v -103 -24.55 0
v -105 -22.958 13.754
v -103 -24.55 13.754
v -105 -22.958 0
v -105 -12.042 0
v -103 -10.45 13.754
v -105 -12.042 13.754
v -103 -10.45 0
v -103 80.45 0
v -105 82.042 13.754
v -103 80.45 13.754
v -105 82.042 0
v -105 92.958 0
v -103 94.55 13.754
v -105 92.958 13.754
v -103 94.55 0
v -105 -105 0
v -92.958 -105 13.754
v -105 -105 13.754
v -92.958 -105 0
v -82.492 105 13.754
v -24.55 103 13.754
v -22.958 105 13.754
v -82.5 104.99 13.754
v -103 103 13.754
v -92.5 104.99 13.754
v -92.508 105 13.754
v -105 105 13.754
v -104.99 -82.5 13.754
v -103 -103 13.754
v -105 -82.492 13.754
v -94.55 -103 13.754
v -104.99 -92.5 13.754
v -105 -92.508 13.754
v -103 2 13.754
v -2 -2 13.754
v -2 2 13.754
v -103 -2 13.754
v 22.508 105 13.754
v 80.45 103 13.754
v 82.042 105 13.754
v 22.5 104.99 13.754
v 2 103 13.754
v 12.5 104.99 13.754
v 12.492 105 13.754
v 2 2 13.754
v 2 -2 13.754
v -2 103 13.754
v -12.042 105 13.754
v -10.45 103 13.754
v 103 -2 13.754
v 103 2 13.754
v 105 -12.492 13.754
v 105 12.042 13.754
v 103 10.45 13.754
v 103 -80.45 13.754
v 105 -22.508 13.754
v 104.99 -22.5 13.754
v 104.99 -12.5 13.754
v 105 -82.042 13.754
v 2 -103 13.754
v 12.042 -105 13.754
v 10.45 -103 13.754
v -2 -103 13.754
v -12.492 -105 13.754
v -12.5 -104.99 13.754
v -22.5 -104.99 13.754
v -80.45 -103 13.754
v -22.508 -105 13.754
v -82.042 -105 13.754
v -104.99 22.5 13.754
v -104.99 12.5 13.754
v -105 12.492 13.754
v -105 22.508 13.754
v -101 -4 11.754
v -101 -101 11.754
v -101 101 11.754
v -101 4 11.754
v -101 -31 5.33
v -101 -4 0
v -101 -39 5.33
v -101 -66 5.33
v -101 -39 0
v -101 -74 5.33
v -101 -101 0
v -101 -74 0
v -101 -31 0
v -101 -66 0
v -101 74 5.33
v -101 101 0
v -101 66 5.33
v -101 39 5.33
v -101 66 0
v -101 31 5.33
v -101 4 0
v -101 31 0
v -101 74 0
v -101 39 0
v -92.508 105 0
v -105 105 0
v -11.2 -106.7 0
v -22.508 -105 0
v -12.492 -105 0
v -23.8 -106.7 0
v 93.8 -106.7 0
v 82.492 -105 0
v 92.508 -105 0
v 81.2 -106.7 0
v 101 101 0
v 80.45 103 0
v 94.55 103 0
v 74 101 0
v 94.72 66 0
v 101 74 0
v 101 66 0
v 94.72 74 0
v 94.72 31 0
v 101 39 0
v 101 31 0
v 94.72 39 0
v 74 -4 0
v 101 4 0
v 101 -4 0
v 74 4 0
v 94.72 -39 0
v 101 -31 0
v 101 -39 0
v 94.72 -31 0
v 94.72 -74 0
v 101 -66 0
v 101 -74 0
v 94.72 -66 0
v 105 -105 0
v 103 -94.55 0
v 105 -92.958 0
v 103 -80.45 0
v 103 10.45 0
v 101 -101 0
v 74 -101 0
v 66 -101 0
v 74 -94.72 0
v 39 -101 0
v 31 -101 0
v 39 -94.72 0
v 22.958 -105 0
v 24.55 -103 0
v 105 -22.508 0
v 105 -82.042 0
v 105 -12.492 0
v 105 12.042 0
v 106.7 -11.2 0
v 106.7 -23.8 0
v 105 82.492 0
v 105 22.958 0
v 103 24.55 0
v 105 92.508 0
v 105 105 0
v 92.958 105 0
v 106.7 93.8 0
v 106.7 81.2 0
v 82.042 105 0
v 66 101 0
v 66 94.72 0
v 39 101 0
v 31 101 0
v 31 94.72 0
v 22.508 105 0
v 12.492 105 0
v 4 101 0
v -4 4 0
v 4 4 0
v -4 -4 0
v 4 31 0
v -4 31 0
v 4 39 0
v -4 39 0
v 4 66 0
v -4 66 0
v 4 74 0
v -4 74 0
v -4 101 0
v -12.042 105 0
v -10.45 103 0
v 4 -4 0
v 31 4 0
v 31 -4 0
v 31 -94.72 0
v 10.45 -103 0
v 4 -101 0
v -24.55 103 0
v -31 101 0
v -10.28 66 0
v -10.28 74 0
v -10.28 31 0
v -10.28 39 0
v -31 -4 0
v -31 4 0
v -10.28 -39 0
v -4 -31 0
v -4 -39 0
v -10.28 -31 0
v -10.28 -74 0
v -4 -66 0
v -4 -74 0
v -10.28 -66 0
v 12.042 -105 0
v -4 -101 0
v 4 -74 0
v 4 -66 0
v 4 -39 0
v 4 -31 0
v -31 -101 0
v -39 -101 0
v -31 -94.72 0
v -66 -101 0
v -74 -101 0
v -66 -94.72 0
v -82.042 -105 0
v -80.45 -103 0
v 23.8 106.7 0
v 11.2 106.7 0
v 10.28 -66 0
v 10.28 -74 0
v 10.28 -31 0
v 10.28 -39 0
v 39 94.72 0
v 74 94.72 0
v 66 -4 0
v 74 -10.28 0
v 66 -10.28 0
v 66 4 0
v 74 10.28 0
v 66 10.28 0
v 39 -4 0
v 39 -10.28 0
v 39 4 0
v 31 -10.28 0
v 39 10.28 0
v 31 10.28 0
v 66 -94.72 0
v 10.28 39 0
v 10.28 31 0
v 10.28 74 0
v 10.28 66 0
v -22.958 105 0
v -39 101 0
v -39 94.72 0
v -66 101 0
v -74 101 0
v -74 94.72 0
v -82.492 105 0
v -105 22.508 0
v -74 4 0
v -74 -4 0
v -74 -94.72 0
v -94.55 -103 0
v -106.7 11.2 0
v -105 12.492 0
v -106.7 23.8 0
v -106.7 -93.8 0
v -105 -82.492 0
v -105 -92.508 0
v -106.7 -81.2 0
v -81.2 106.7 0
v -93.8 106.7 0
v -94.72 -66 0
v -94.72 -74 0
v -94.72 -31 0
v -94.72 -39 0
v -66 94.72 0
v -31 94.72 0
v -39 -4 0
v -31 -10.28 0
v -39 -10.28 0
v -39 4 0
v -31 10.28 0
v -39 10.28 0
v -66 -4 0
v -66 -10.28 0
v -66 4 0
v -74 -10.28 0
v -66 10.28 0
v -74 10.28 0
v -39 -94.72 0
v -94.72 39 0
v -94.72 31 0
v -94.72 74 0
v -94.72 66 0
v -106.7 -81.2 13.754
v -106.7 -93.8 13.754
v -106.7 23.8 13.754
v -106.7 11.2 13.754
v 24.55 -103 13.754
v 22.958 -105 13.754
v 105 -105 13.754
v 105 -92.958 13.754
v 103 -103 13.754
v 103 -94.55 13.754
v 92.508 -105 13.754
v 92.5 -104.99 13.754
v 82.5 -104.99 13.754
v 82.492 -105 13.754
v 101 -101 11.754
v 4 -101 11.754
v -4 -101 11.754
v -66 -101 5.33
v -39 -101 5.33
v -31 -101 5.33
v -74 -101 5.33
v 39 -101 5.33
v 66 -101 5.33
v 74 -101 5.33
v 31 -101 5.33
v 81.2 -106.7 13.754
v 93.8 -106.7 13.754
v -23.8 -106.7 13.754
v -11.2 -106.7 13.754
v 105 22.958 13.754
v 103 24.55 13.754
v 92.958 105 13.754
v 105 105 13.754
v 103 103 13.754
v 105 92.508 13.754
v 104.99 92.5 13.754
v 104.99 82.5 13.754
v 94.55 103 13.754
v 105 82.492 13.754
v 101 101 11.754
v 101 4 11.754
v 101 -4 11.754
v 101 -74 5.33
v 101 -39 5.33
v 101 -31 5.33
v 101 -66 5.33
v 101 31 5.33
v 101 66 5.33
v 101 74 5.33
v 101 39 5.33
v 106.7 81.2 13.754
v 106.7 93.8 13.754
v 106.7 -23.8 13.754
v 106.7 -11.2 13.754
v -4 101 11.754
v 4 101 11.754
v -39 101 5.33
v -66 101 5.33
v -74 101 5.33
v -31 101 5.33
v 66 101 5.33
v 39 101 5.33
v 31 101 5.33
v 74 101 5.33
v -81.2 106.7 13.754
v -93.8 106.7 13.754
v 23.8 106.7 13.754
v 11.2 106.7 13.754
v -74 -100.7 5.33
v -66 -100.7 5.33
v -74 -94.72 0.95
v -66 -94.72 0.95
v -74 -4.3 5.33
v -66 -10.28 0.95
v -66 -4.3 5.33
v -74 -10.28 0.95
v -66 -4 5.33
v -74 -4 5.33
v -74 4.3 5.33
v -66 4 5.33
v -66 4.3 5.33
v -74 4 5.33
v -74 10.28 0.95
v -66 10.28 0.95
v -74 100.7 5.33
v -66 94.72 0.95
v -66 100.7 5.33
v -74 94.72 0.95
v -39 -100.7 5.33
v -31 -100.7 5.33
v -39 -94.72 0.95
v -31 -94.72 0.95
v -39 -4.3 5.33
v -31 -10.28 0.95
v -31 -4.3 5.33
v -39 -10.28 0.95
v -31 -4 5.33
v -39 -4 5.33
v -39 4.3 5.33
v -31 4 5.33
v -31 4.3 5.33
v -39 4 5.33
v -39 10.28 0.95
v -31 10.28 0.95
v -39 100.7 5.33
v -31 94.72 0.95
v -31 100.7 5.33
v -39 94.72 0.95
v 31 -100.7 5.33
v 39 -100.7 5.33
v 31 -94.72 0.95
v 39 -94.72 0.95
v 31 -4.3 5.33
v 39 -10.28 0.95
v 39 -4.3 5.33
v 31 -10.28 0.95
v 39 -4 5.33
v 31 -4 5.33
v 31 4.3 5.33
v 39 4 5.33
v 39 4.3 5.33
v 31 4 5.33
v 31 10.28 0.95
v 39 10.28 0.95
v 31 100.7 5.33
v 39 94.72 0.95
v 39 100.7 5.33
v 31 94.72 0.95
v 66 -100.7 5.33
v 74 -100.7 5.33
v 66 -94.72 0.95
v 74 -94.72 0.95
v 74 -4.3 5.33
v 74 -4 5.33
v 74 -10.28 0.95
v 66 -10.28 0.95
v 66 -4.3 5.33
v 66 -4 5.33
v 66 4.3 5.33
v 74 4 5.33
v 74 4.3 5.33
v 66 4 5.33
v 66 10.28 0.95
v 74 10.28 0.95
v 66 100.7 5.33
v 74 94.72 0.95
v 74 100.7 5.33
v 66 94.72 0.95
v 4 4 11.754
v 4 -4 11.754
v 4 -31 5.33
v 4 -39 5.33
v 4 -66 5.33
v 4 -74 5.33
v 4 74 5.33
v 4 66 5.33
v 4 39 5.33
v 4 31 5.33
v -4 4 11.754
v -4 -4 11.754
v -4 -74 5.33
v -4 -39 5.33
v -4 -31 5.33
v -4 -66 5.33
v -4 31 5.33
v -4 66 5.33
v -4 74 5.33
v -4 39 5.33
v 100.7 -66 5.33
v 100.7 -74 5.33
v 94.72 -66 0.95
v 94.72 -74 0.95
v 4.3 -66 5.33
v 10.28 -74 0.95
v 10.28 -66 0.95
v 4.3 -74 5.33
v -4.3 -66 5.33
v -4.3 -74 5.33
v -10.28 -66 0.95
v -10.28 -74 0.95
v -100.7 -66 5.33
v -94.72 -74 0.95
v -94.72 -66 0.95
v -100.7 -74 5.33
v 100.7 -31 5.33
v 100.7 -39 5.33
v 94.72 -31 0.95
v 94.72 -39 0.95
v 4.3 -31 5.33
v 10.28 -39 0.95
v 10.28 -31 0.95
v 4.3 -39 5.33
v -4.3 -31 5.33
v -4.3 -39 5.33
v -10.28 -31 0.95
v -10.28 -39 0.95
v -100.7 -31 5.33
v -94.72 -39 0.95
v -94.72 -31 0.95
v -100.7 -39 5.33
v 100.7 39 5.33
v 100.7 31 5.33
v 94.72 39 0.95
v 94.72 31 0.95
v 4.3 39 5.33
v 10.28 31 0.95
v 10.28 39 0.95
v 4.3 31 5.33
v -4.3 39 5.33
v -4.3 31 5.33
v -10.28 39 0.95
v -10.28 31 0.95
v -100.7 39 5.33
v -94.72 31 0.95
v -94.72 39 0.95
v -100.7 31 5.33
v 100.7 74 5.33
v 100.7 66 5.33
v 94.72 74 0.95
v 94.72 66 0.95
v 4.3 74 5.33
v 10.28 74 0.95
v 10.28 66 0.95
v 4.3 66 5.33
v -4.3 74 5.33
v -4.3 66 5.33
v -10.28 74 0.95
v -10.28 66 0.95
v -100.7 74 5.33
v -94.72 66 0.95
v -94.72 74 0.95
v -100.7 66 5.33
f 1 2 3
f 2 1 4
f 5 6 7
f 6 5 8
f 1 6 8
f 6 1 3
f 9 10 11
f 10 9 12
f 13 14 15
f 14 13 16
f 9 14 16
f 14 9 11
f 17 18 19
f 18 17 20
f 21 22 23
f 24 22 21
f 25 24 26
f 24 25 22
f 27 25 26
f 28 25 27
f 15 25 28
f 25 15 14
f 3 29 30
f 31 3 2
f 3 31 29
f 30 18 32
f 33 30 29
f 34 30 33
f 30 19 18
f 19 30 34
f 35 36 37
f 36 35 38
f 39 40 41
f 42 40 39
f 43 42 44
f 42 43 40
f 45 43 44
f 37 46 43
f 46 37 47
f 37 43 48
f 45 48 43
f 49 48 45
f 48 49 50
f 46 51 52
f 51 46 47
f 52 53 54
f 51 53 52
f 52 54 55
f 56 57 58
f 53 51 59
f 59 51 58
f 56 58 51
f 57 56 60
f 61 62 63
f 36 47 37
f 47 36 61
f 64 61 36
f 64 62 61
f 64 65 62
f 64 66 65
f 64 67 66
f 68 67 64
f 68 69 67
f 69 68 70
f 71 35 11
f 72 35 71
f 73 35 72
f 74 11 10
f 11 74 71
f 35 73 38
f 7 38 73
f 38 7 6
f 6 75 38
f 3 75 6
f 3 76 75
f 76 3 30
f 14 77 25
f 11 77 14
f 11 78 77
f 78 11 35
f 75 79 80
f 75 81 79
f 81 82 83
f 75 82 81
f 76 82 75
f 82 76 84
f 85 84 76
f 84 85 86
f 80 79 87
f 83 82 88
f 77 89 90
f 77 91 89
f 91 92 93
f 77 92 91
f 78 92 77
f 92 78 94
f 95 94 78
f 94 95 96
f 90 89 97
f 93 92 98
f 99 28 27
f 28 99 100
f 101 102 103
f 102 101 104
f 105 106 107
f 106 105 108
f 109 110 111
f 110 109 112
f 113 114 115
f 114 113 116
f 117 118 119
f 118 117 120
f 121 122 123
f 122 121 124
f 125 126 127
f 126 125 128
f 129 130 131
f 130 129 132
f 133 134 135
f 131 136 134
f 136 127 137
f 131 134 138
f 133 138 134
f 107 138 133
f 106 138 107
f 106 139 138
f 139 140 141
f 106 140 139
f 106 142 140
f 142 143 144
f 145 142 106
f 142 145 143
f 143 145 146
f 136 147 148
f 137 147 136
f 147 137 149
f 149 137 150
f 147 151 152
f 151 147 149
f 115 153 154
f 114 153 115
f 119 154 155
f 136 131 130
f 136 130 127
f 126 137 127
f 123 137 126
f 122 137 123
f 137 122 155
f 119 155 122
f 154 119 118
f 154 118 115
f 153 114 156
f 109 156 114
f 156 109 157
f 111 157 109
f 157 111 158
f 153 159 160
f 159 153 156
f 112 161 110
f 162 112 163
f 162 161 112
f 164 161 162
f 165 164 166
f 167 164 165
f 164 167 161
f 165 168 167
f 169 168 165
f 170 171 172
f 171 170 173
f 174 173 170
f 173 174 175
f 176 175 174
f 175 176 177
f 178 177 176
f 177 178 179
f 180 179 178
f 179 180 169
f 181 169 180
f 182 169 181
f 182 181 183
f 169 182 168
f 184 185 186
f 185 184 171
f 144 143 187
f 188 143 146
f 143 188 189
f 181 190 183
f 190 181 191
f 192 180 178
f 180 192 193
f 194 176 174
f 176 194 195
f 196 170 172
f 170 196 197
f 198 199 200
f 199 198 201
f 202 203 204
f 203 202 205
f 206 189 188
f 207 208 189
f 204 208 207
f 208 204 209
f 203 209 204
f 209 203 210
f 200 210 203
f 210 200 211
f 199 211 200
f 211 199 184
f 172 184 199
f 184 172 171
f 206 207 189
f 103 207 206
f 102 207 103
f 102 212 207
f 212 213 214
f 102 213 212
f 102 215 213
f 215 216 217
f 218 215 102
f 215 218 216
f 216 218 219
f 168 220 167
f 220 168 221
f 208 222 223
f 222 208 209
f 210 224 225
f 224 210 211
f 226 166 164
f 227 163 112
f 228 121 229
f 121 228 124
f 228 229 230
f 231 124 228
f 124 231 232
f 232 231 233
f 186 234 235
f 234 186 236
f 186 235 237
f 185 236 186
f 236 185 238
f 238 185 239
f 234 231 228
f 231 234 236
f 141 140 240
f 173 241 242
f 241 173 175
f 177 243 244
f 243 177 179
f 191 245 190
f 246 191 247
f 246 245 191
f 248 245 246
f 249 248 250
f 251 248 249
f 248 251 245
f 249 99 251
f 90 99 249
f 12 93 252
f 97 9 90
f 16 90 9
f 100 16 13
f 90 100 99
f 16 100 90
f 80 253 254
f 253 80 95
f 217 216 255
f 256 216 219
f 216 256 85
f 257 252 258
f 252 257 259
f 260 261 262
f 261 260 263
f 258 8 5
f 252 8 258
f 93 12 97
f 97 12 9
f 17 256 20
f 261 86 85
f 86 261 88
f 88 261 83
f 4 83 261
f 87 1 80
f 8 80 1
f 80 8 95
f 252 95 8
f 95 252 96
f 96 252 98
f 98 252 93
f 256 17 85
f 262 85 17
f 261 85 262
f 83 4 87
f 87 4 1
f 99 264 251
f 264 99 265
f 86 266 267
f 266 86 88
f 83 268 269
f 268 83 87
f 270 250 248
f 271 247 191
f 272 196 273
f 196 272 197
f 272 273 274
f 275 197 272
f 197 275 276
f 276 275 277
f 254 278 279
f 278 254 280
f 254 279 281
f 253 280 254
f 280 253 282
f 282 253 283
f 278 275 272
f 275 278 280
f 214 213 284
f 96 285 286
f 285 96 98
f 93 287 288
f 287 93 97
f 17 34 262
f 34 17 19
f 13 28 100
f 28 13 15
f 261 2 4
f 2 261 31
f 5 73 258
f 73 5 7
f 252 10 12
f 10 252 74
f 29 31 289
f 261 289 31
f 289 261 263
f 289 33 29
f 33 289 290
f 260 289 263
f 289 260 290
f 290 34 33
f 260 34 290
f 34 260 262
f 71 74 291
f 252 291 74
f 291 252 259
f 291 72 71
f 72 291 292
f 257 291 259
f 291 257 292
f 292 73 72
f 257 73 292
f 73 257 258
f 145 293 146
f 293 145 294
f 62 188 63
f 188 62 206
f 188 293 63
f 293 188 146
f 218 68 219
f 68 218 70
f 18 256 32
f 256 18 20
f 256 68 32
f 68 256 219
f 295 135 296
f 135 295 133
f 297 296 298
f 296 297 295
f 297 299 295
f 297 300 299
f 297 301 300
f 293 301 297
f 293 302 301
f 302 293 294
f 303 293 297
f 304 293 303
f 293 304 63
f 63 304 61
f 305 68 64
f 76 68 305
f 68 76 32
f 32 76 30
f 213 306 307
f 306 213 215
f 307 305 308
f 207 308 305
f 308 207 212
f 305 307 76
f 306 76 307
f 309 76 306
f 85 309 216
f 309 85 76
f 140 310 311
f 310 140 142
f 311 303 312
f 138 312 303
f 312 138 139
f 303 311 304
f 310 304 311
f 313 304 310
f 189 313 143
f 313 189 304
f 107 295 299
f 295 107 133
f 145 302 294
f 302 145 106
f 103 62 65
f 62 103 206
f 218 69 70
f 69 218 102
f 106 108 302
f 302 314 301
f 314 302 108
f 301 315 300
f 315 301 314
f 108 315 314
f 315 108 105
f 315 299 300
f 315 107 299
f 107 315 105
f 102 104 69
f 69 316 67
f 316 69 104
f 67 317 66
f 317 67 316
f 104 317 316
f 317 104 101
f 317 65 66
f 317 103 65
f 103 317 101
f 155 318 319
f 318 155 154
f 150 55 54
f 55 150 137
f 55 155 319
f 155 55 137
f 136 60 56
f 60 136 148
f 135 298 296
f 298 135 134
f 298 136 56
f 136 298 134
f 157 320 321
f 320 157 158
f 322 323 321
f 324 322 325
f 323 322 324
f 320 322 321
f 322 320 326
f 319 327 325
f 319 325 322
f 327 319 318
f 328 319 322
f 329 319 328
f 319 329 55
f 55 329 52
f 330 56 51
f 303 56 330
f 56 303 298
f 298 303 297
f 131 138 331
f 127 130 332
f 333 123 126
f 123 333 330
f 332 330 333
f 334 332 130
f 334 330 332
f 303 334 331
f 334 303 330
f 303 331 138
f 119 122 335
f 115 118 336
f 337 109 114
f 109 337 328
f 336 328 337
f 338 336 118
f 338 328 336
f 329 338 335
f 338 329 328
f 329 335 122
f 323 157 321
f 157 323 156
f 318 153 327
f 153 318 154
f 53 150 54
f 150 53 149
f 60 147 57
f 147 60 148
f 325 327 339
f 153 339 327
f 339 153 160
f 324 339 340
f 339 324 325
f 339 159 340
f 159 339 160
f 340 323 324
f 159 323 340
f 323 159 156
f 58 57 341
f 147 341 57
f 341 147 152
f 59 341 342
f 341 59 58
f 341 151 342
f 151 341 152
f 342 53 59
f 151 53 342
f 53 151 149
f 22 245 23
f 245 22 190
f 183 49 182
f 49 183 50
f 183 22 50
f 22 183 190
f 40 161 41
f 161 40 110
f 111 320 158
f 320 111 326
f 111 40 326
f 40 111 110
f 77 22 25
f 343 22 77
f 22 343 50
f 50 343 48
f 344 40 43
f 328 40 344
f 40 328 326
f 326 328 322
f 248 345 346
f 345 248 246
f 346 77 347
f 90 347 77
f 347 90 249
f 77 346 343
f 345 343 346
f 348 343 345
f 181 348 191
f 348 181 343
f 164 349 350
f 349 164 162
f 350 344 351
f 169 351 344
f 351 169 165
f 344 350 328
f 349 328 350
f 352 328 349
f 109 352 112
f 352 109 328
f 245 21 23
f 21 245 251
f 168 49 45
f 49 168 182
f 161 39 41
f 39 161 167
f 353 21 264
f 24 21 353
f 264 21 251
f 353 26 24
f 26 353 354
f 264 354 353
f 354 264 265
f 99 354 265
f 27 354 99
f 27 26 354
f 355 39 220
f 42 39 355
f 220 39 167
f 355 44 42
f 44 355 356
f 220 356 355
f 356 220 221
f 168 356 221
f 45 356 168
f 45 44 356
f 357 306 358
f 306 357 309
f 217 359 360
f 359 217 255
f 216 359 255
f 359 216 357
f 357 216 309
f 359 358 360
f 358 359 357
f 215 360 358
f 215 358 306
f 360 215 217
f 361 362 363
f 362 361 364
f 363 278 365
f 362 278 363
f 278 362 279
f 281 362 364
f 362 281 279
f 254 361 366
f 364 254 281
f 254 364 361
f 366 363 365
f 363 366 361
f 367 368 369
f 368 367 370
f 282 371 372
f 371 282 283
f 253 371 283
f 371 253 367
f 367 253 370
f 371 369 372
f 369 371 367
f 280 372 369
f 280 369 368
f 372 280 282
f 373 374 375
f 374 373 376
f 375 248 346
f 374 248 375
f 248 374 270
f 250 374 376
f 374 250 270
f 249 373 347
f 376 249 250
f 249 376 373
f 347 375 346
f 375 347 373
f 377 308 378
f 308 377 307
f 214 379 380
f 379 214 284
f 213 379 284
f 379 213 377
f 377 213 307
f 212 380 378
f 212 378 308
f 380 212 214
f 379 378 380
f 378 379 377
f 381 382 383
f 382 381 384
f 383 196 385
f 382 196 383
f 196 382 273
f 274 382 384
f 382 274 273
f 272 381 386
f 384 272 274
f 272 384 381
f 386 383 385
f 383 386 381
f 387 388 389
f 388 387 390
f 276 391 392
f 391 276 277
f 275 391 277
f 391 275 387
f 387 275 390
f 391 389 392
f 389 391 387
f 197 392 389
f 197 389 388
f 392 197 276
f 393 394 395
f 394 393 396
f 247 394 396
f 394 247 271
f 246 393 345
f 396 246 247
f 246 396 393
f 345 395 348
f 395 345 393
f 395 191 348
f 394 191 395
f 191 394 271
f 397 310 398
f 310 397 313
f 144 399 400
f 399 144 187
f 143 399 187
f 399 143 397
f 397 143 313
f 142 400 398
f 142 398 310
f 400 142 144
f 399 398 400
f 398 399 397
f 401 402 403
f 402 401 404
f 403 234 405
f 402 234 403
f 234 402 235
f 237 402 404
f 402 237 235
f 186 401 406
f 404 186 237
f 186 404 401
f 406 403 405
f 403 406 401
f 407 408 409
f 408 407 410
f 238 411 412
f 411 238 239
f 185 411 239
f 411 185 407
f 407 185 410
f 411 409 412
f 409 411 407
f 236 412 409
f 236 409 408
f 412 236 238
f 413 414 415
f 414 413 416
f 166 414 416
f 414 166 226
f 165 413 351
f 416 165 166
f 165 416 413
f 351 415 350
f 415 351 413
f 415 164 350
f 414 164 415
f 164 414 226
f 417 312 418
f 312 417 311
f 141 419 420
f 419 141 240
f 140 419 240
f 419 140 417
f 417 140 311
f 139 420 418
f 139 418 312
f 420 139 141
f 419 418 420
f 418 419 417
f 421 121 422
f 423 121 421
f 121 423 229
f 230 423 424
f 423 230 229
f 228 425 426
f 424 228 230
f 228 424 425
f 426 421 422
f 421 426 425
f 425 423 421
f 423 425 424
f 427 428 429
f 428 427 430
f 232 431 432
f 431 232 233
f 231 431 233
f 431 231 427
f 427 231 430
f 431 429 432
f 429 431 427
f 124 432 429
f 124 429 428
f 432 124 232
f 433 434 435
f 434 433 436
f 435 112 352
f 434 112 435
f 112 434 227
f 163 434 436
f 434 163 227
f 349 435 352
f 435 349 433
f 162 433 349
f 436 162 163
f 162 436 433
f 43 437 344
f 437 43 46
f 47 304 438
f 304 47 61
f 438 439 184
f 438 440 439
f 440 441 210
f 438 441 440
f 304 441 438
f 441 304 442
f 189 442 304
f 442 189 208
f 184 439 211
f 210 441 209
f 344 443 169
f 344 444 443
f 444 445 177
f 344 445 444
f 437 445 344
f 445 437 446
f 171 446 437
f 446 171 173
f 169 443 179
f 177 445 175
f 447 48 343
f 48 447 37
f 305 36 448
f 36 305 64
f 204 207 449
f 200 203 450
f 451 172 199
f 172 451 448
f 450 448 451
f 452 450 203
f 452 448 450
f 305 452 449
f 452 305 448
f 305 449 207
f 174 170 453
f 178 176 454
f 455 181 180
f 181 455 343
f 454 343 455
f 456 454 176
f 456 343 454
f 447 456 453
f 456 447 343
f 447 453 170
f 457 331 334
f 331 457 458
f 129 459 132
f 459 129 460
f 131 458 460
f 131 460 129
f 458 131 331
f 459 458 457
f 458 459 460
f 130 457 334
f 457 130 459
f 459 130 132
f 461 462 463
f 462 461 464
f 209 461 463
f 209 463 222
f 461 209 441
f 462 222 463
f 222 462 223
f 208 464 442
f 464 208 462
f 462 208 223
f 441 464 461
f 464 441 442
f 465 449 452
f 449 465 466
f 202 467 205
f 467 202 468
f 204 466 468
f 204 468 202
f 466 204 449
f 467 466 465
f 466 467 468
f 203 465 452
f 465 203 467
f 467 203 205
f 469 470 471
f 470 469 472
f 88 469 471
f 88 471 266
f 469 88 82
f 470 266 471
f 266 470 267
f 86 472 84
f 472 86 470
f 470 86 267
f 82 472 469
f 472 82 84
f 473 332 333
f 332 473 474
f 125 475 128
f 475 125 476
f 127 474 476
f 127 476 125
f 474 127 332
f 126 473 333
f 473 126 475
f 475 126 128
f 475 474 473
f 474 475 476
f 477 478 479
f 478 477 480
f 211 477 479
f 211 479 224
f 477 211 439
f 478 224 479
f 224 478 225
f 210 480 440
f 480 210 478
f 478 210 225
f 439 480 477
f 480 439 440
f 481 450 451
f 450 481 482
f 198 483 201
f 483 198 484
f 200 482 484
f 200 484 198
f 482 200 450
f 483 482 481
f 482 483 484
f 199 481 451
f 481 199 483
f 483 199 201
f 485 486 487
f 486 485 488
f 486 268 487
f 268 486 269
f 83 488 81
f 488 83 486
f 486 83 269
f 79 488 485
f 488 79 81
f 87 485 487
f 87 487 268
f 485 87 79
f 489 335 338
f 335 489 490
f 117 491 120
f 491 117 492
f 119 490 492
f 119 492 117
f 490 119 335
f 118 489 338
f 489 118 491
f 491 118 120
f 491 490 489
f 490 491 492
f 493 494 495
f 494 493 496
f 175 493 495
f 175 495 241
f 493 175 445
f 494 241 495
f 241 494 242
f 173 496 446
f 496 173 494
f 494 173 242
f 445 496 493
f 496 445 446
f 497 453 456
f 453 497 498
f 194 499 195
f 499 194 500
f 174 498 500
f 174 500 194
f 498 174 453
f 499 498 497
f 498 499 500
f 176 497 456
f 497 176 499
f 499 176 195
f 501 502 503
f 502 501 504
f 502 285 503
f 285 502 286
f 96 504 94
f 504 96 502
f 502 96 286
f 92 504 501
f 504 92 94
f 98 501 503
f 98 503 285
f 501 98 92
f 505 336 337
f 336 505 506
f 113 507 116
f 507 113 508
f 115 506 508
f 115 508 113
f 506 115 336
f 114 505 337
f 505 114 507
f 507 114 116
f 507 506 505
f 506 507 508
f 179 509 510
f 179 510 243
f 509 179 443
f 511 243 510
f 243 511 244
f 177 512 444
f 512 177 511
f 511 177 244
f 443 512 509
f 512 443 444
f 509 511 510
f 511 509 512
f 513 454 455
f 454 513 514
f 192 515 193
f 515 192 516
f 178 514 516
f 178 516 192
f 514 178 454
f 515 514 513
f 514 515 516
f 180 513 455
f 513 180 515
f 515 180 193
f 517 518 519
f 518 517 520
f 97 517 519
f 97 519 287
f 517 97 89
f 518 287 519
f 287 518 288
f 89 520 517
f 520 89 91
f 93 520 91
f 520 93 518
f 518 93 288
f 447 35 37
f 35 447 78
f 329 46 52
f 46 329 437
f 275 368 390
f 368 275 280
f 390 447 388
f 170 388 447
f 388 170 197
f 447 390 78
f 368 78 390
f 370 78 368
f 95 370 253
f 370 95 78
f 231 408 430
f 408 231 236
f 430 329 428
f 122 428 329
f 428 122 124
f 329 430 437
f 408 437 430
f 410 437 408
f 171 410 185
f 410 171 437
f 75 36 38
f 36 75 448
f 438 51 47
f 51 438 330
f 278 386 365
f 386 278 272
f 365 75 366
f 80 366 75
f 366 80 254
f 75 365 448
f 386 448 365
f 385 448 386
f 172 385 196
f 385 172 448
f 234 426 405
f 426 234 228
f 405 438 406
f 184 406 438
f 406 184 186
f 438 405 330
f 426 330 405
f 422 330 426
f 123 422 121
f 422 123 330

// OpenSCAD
// Total height
height = 13.75365;
// Inside bevel
inset = 2;

// Outside and inside size of a single square
size = 35;
isize = 27; 

// Dimensions of connectors
clen = 12.6;
cwid = 1.7;
coff = 1.3;
ctol = 0.3;

cells_x = 6;
cells_y = 6;

cell_jmp = 3;

*color("#aaa") {
    *import("DB to XL Grid Adaptor.stl", 10);
    *#translate([1.5*size, 1.5*size, 0]) import("XL Lock Grid.stl", 10);
    translate([4.5*size, 1.5*size, 0]) import("XL Lock Grid.stl", 10);
    translate([4.5*size, -1.5*size, 0]) import("XL Lock Grid.stl", 10);
    *import("Grid 3x3.stl", 10);
    *import("grid 6x6.stl", 10);
}

render(convexity=10)
grid(cells_x, cells_y);

module grid(cx, cy)
{
    owid = (size-isize)/2;
    rotate([0,0,  0]) translate([-size*cx/2, -size*cy/2, 0]) obeam(cy, owid);
    rotate([0,0, 90]) translate([-size*cy/2, -size*cx/2, 0]) obeam(cx, owid);
    rotate([0,0,180]) translate([-size*cx/2, -size*cy/2, 0]) obeam(cy, owid);
    rotate([0,0,270]) translate([-size*cy/2, -size*cx/2, 0]) obeam(cx, owid);
    for (x=[1:cx-1]) {
        if (x % cell_jmp == 0) {
            translate([(x-cx/2)*size,-size*cy/2,0]) ibeam(cy, owid);
        } else {
            for (y=[0:cell_jmp:cy-1]) {
                translate([(x-cx/2)*size, size*(-cy/2+y),0]) ifoot();
                translate([(x-cx/2)*size, size*(-cy/2+y+cell_jmp),0]) mirror([0,1,0]) ifoot();
            }
        }
    }
    for (y=[1:cy-1]) {
        rotate([0,0, 90]) if (y % cell_jmp == 0) {
            translate([(y-cy/2)*size,-size*cx/2,0]) ibeam(cx, owid);
        } else {
            for (x=[0:cell_jmp:cx-1]) {
                translate([(y-cy/2)*size, size*(-cx/2+x),0]) ifoot();
                translate([(y-cy/2)*size, size*(-cx/2+x+cell_jmp),0]) mirror([0,1,0]) ifoot();
            }
        }
    }
}

module ifoot(len=8, wid=10.28, hei=5.33, wst=4.3, hst=0.95)
{
    rotate([0,-90,0]) translate([0, 0, -len/2]) linear_extrude(height=len, convexity=6) polygon([
        [0, wst-hst], [0, wid], [hst, wid], [hei, wst], [hei, wst-hst]
    ]);
}

module obeam(cells, wid)
{
    len = cells*size;
    difference() {
        rotate([90,0,0]) translate([0,0,-len]) linear_extrude(height=len, convexity=6) polygon([
            [0, 0], [wid, 0], [wid, height-inset], [wid-inset, height], [0, height]
        ]);
        for (y=[2.5*size:3*size:len]) {
            translate([0, y, -0.01]) mirror([1,0,0]) slot(clen+ctol*5, cwid+ctol, coff+ctol, height+0.02);
        }
    }
    for (y=[0.5*size:3*size:len]) {
        translate([0, y, 0]) slot(clen, cwid, coff, height);
    }
}

module slot(len, wid, off, hi)
{
        linear_extrude(height=hi, convexity=6) polygon([
            [-wid, -len/2], [-wid, len/2], [0.01, len/2-off], [0.01, -(len/2-off)]
        ]);
}

module ibeam(cells, wid)
{
    len = cells*size;
    rotate([90,0,0]) translate([0,0,-len]) linear_extrude(height=len, convexity=6) polygon([
        [-wid, 0], [wid, 0], [wid, height-inset], [wid-inset, height], [inset-wid, height], [-wid, height-inset]
    ]);
}
